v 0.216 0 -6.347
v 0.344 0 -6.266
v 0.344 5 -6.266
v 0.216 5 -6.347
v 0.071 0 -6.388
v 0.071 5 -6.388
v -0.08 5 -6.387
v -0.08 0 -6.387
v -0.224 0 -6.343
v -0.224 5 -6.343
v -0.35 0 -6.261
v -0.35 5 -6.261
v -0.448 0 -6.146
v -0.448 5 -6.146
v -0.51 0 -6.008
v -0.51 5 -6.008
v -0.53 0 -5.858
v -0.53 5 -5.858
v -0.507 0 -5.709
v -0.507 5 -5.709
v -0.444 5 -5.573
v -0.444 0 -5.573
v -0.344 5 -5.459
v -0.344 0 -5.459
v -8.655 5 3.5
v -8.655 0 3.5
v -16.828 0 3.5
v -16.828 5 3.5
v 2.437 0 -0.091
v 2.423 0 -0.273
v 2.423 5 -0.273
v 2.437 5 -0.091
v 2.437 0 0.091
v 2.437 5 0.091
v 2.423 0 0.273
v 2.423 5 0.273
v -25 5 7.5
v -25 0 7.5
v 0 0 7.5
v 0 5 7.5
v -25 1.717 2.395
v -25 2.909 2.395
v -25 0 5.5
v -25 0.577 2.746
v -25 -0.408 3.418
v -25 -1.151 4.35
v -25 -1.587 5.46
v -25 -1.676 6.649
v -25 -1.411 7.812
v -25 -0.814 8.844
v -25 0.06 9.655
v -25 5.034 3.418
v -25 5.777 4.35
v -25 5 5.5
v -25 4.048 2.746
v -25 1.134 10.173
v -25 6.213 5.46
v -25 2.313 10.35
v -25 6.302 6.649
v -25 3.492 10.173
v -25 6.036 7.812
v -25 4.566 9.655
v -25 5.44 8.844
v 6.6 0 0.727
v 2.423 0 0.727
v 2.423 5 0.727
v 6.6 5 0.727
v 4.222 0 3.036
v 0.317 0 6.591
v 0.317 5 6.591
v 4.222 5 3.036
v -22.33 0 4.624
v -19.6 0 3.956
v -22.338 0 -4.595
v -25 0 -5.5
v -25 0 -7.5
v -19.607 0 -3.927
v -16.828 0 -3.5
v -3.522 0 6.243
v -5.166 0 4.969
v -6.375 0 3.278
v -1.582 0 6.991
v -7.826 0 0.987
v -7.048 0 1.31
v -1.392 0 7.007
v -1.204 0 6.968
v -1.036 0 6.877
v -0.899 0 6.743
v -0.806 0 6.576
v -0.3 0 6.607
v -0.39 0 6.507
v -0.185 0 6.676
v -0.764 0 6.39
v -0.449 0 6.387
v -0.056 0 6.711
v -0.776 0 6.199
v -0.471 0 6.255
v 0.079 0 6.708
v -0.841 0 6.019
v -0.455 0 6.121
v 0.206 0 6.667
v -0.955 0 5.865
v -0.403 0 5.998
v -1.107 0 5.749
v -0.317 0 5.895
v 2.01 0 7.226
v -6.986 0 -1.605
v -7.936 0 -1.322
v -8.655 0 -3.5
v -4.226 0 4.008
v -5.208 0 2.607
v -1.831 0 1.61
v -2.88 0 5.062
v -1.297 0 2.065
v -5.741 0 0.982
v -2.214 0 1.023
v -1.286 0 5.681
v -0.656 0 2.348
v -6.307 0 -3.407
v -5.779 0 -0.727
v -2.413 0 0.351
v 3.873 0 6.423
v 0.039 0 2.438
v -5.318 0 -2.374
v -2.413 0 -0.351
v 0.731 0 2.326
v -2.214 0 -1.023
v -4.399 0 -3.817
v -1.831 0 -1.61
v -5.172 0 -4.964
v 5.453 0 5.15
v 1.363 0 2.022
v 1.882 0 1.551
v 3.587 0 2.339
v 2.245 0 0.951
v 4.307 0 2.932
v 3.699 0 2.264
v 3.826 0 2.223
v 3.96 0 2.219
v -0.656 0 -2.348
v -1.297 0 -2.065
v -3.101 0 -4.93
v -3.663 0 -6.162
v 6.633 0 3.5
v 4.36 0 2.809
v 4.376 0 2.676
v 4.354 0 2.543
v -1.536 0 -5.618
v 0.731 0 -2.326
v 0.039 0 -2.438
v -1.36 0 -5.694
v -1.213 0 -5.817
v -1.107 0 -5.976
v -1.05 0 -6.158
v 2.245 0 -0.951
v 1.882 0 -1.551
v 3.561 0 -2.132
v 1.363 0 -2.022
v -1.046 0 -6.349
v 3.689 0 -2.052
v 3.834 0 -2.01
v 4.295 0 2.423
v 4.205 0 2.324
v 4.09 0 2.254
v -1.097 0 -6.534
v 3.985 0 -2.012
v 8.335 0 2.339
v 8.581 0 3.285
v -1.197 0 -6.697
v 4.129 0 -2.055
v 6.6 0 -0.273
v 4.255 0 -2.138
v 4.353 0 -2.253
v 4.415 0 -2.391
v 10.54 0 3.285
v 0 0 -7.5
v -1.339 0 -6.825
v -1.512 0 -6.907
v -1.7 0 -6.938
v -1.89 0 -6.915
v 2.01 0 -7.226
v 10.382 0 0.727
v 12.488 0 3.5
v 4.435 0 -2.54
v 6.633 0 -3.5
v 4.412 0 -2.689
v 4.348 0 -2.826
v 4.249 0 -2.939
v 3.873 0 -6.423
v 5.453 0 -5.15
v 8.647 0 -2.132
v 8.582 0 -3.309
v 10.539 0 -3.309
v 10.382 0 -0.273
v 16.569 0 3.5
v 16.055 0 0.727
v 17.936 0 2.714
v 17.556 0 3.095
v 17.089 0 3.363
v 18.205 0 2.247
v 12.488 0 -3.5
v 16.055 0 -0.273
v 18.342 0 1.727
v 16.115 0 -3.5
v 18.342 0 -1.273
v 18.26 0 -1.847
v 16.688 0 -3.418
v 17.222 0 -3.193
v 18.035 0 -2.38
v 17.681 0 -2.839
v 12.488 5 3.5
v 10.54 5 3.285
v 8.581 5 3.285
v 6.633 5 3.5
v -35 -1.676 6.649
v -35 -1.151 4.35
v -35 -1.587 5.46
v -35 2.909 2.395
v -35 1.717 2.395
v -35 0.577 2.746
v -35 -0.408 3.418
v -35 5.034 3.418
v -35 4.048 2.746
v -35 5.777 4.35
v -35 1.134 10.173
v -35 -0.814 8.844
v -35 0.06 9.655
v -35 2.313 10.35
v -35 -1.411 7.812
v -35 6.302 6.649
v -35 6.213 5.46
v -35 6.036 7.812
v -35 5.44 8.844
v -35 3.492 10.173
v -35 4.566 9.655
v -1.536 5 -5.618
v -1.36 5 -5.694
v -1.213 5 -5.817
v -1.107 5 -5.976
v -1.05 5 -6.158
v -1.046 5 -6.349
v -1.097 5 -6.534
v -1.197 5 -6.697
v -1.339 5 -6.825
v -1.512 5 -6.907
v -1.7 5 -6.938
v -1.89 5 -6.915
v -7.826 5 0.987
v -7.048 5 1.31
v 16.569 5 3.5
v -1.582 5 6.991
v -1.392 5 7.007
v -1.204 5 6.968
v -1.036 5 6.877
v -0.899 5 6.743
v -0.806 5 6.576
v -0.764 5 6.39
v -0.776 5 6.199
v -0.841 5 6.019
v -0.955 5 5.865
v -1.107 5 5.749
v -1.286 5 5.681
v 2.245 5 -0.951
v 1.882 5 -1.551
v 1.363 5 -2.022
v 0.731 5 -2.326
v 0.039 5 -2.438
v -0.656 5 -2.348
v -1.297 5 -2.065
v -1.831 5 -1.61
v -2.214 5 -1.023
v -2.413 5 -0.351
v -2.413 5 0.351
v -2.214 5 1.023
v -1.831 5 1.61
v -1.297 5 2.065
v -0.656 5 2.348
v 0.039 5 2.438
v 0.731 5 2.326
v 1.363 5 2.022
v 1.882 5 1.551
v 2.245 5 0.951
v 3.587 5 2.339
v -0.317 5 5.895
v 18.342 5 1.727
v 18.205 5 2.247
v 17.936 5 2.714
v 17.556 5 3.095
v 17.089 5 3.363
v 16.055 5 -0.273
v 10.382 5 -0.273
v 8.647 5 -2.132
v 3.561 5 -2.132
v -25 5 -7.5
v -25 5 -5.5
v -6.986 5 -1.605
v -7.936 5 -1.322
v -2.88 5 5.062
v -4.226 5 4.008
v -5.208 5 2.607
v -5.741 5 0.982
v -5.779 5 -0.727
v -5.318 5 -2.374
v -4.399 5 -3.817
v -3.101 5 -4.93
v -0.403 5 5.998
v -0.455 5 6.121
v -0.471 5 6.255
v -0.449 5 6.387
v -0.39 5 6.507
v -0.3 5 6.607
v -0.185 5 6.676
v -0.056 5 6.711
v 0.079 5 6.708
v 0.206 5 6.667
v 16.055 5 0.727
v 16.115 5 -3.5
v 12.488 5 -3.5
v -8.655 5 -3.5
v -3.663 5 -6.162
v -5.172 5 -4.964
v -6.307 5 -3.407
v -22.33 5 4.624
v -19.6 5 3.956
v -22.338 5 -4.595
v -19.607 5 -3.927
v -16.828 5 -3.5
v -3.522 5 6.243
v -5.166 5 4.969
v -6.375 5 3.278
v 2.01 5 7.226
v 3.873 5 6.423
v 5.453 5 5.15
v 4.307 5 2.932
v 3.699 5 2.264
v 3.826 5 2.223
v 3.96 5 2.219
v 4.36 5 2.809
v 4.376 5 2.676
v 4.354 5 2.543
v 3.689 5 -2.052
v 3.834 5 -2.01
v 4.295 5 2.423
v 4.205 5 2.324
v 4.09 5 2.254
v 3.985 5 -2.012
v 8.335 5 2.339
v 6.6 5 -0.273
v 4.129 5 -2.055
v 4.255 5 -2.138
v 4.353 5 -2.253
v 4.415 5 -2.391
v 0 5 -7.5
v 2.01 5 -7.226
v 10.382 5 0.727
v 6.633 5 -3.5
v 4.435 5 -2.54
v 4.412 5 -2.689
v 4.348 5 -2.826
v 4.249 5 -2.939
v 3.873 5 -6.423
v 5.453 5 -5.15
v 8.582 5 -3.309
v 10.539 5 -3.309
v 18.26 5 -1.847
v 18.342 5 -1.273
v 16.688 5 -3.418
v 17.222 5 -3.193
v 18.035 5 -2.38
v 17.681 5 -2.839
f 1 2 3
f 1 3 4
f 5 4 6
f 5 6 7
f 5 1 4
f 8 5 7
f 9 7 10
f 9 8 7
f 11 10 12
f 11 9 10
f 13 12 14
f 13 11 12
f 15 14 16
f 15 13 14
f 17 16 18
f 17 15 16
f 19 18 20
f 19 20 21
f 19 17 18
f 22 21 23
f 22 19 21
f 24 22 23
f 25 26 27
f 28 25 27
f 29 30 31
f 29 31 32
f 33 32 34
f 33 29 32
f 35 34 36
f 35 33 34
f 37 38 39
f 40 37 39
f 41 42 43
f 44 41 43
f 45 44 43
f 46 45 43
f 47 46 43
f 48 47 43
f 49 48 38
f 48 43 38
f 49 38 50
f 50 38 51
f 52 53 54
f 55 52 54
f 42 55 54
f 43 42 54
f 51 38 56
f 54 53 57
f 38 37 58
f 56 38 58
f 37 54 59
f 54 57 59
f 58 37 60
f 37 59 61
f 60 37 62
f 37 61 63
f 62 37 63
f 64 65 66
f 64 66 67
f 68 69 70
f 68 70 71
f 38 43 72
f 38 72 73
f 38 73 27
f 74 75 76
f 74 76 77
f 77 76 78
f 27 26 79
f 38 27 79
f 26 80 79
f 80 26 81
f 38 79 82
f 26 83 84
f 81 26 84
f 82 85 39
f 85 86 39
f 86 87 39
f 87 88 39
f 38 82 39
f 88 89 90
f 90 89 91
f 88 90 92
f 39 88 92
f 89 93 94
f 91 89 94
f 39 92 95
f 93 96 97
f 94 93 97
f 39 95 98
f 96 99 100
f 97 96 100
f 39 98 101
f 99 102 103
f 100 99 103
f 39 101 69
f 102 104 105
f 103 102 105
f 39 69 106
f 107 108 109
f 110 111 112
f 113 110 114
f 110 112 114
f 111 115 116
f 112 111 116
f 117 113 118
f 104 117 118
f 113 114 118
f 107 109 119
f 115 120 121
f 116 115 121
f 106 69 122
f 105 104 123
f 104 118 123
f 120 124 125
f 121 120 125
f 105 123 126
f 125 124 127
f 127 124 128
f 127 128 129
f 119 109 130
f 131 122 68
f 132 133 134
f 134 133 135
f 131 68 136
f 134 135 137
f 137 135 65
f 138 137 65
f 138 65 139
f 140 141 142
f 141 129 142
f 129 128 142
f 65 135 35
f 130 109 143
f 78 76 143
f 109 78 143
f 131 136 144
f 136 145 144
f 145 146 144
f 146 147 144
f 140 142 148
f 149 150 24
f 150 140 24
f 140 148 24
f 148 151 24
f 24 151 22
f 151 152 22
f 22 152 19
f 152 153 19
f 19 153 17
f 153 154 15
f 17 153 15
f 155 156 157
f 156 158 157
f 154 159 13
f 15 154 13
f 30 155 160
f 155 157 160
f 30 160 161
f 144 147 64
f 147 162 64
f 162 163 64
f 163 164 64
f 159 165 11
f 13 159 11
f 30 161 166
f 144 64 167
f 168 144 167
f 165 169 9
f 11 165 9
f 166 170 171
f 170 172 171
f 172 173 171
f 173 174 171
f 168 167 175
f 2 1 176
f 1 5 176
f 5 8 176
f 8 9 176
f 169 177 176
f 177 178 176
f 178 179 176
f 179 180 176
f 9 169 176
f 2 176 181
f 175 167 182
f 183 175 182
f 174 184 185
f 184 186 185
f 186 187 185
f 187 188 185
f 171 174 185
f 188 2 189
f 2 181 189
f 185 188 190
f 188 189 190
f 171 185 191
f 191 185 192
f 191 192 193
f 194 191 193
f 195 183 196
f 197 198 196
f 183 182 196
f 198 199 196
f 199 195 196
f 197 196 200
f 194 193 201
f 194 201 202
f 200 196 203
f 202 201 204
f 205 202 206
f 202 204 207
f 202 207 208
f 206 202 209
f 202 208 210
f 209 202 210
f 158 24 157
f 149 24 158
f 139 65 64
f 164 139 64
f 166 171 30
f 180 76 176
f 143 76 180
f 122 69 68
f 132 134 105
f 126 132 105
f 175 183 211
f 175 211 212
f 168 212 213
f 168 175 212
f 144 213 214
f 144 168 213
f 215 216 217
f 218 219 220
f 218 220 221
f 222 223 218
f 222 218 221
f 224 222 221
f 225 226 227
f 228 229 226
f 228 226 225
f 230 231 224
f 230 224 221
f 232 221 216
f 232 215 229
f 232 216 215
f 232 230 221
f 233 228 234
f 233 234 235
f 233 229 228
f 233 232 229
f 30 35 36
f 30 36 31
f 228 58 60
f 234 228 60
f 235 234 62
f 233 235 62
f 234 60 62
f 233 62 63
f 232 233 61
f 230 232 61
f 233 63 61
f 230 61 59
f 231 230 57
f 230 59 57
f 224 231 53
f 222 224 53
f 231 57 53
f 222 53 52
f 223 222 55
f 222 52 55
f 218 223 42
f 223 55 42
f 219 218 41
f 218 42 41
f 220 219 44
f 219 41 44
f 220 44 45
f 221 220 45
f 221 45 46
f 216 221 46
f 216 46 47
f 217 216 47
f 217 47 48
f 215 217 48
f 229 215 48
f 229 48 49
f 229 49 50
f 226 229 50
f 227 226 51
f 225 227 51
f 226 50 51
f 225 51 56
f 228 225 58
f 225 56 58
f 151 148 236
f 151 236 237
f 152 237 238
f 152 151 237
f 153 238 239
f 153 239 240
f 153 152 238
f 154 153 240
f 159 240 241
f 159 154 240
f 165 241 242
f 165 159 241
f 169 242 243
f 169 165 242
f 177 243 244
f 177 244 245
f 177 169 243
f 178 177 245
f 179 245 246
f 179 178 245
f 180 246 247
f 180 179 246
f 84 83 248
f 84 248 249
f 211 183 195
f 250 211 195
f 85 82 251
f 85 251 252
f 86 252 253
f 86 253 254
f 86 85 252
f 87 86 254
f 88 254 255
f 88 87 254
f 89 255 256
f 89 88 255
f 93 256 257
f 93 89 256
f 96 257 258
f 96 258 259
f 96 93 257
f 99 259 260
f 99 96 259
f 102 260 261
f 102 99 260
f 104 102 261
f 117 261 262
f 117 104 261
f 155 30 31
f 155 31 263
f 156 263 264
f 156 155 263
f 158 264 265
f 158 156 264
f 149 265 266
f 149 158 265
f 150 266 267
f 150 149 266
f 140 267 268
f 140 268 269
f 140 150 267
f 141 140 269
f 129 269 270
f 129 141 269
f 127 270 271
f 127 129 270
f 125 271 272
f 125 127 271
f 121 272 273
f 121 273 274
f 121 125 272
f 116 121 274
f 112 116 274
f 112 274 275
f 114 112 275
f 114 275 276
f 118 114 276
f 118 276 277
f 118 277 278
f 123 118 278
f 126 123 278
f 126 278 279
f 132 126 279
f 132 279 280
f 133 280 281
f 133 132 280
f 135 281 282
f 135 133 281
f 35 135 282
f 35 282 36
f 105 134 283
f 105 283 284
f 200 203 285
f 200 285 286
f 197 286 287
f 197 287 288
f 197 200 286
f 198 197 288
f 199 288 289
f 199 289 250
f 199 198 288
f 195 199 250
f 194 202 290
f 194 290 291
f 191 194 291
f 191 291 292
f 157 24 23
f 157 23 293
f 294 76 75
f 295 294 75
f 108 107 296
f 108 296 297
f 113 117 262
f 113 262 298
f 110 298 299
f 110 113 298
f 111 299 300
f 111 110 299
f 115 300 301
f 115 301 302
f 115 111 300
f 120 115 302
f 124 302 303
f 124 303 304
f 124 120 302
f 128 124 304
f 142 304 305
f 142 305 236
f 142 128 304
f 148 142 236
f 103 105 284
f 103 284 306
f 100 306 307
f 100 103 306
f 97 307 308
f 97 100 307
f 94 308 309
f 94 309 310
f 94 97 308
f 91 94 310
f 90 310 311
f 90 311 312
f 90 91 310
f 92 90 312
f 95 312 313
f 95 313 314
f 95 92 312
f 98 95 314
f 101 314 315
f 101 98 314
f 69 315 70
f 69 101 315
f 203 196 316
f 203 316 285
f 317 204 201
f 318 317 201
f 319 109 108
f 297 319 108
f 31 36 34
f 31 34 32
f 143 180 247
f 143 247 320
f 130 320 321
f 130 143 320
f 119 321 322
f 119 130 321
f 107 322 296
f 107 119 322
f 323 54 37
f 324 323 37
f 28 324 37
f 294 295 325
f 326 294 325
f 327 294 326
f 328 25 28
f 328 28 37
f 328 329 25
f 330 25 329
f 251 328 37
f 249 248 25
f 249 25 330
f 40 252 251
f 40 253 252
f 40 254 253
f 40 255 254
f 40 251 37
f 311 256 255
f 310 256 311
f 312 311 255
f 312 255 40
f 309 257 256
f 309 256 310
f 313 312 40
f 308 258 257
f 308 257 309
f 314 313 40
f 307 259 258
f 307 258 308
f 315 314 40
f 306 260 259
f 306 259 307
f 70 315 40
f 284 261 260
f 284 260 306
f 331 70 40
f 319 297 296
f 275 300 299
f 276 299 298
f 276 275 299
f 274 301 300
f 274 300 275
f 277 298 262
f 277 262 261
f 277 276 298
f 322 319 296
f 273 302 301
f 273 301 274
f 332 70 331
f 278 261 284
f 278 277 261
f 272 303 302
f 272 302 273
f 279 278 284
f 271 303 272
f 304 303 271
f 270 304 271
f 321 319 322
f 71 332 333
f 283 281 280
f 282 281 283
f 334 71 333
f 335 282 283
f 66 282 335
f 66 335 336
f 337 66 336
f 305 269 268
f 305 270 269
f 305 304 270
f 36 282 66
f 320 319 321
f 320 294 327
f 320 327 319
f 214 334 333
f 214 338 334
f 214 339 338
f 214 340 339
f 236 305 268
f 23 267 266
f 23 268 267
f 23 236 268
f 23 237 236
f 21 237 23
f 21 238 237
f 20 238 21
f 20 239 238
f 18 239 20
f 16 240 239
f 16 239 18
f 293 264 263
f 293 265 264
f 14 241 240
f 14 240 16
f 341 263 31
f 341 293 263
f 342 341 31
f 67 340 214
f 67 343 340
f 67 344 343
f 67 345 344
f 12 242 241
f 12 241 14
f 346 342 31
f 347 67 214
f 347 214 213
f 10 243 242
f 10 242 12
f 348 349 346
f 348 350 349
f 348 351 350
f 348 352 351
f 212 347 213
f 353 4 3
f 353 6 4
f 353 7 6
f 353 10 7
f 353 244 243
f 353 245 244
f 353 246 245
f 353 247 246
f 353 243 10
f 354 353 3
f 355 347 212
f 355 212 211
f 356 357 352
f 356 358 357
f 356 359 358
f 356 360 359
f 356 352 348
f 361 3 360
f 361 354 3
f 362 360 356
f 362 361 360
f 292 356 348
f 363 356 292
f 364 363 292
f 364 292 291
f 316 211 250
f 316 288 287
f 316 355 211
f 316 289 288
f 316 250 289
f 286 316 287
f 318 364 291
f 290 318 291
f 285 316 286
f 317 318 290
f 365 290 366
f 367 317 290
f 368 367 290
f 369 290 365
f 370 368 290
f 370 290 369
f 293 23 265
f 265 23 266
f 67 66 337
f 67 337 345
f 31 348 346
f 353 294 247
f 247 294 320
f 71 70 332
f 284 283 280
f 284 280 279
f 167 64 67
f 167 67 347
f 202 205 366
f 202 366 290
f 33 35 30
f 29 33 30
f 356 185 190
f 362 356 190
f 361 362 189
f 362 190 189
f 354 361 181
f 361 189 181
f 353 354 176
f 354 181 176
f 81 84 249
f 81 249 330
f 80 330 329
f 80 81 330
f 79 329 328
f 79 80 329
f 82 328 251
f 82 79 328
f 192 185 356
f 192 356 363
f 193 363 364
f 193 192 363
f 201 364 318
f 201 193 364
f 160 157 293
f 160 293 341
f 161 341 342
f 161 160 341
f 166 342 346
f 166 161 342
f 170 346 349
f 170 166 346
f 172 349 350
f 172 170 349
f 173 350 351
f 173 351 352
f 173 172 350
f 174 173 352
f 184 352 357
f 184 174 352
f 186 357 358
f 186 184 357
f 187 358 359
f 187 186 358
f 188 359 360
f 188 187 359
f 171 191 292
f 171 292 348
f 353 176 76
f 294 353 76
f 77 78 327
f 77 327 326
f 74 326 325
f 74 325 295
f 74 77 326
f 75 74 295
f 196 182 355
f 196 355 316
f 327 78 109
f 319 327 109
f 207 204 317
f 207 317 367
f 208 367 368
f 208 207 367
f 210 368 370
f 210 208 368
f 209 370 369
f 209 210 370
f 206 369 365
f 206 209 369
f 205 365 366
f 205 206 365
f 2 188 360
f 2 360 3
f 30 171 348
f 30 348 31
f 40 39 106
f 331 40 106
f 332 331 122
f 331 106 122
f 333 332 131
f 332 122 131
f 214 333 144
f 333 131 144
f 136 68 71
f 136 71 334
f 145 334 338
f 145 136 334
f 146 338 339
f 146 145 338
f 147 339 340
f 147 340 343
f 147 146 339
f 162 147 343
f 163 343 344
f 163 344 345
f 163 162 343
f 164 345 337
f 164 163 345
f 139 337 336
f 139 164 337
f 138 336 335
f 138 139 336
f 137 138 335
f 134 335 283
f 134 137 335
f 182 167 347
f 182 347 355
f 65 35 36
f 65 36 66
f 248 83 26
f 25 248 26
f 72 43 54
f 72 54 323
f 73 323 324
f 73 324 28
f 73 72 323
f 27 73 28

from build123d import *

# Parameters (mm, degrees)
BOSS_EXTRUDE1_DEPTH = 5
CUT_EXTRUDE1_START  = -5
CUT_EXTRUDE1_DEPTH  = 5
SKETCH3_R           = 4
BOSS_EXTRUDE2_DEPTH = 10


# Read off the part's stored shape, not the designer's step: Cut-Extrude1
with BuildPart() as part:
    # Sketch1 → Boss-Extrude1 (new body)
    with BuildSketch(Plane(origin=(0, 0, 0), x_dir=(1, 0, 0), z_dir=(0, 1, 0))):
        with BuildLine():
            Line((-6.633249581, -3.5), (-8.655407426, -3.5))
            Line((-8.655407426, -3.5), (-25, -3.5))
            Line((-25, -3.5), (-25, -7.5))
            Line((-25, -7.5), (0, -7.5))
            ThreePointArc((0, -7.5), (-3.872983346, -6.422616289), (-6.633249581, -3.5))
        make_face()
        with BuildLine():
            ThreePointArc((-6.633249581, -3.5), (-7.280088319, -1.802862744), (-7.5, 0))
            Line((-7.5, 0), (-8.655407426, -3.5))
            Line((-8.655407426, -3.5), (-6.633249581, -3.5))
        make_face()
        with BuildLine():
            Line((-8.655407426, 3.5), (-7.5, 0))
            ThreePointArc((-7.5, 0), (-7.280088319, 1.802862744), (-6.633249581, 3.5))
            Line((-6.633249581, 3.5), (-8.655407426, 3.5))
        make_face()
        with BuildLine():
            Line((-25, 3.5), (-8.655407426, 3.5))
            Line((-8.655407426, 3.5), (-6.633249581, 3.5))
            ThreePointArc((-6.633249581, 3.5), (-3.872983346, 6.422616289), (0, 7.5))
            Line((0, 7.5), (-25, 7.5))
            Line((-25, 7.5), (-25, 3.5))
        make_face()
        with BuildLine():
            ThreePointArc((0, 7.5), (-3.872983346, 6.422616289), (-6.633249581, 3.5))
            Line((-6.633249581, 3.5), (0, 3.5))
            Line((0, 3.5), (0, 7.5))
        make_face()
        with BuildLine():
            ThreePointArc((-6.633249581, 3.5), (-7.280088319, 1.802862744), (-7.5, 0))
            ThreePointArc((-7.5, 0), (-7.280088319, -1.802862744), (-6.633249581, -3.5))
            Line((-6.633249581, -3.5), (0, -3.5))
            Line((0, -3.5), (0, -7.5))
            ThreePointArc((0, -7.5), (3.872983346, -6.422616289), (6.633249581, -3.5))
            Line((6.633249581, -3.5), (5.841817388, -3.5))
            Line((5.841817388, -3.5), (5.841817388, 3.5))
            Line((5.841817388, 3.5), (6.633249581, 3.5))
            ThreePointArc((6.633249581, 3.5), (3.872983346, 6.422616289), (0, 7.5))
            Line((0, 7.5), (0, 3.5))
            Line((0, 3.5), (-6.633249581, 3.5))
        make_face()
        with BuildLine():
            Line((0, -3.5), (-6.633249581, -3.5))
            ThreePointArc((-6.633249581, -3.5), (-3.872983346, -6.422616289), (0, -7.5))
            Line((0, -7.5), (0, -3.5))
        make_face()
        with BuildLine():
            Line((5.841817388, -3.5), (6.633249581, -3.5))
            ThreePointArc((6.633249581, -3.5), (7.280088319, -1.802862744), (7.5, 0))
            ThreePointArc((7.5, 0), (7.280088319, 1.802862744), (6.633249581, 3.5))
            Line((6.633249581, 3.5), (5.841817388, 3.5))
            Line((5.841817388, 3.5), (5.841817388, -3.5))
        make_face()
        with BuildLine():
            ThreePointArc((7.5, 0), (7.280088319, -1.802862744), (6.633249581, -3.5))
            Line((6.633249581, -3.5), (18.341817388, -3.5))
            Line((18.341817388, -3.5), (18.341817388, 3.5))
            Line((18.341817388, 3.5), (6.633249581, 3.5))
            ThreePointArc((6.633249581, 3.5), (7.280088319, 1.802862744), (7.5, 0))
        make_face()
    extrude(amount=BOSS_EXTRUDE1_DEPTH)

    # Cut-Extrude1 outline → Cut-Extrude1 (cut)
    with BuildSketch(Plane(origin=(0, 5, 0), x_dir=(1, 0, 0), z_dir=(0, 1, 0)).offset(CUT_EXTRUDE1_START)):
        with BuildLine():
            ThreePointArc((-25, -5.5), (-20.971570556, -4.264152844), (-16.827703713, -3.5))
            Line((-16.827703713, -3.5), (-25, -3.5))
            Line((-25, -3.5), (-25, -5.5))
        make_face()
        with BuildLine():
            Line((-6.986211906, 1.605049615), (-7.936290273, 1.321625532))
            Line((-7.936290273, 1.321625532), (-7.5, 0))
            Line((-7.5, 0), (-7.82594424, -0.987361527))
            Line((-7.82594424, -0.987361527), (-7.04751698, -1.309902849))
            ThreePointArc((-7.04751698, -1.309902849), (-5.16604089, -4.969442885), (-1.582216118, -6.991418541))
            ThreePointArc((-1.582216118, -6.991418541), (-0.778502232, -6.484346421), (-1.285574352, -5.680632535))
            ThreePointArc((-1.285574352, -5.680632535), (-5.822856725, -0.128945605), (-1.535782965, 5.618154331))
            ThreePointArc((-1.535782965, 5.618154331), (-1.064786538, 6.443527284), (-1.890159491, 6.914523712))
            ThreePointArc((-1.890159491, 6.914523712), (-5.171568533, 4.963690156), (-6.986211906, 1.605049615))
        make_face()
        with BuildLine():
            ThreePointArc((-16.827703713, 3.5), (-20.979738657, 4.230776773), (-25, 5.5))
            Line((-25, 5.5), (-25, 3.5))
            Line((-25, 3.5), (-16.827703713, 3.5))
        make_face()
        with BuildLine():
            Line((2.423046834, -0.273137336), (2.423046834, 0.273137336))
            ThreePointArc((2.423046834, 0.273137336), (-2.438392906, 0), (2.423046834, -0.273137336))
        make_face()
        with BuildLine():
            ThreePointArc((6.633249581, 3.5), (9.560391533, 3.285101605), (12.487533484, 3.5))
            Line((12.487533484, 3.5), (6.633249581, 3.5))
        make_face()
        with BuildLine():
            ThreePointArc((16.114954724, 3.5), (17.680951034, 2.839133646), (18.341817388, 1.273137336))
            Line((18.341817388, 1.273137336), (18.341817388, 3.5))
            Line((18.341817388, 3.5), (16.114954724, 3.5))
        make_face()
        with BuildLine():
            Line((6.633249581, -3.5), (12.487533484, -3.5))
            ThreePointArc((12.487533484, -3.5), (9.560391532, -3.257612869), (6.633249581, -3.5))
        make_face()
        with BuildLine():
            Line((18.341817388, -3.5), (18.341817388, -1.726862664))
            ThreePointArc((18.341817388, -1.726862664), (17.758698799, -2.916881411), (16.568680051, -3.5))
            Line((16.568680051, -3.5), (18.341817388, -3.5))
        make_face()
        with BuildLine():
            Line((6.599609394, 0.273137336), (2.423046834, 0.273137336))
            ThreePointArc((2.423046834, 0.273137336), (2.438392906, 0), (2.423046834, -0.273137336))
            Line((2.423046834, -0.273137336), (2.423046834, -0.726862664))
            Line((2.423046834, -0.726862664), (6.599609394, -0.726862664))
            Line((6.599609394, -0.726862664), (8.33499846, -2.338830502))
            Line((8.33499846, -2.338830502), (10.382432111, -0.726862664))
            Line((10.382432111, -0.726862664), (16.055042397, -0.726862664))
            Line((16.055042397, -0.726862664), (18.341817388, -1.726862664))
            Line((18.341817388, -1.726862664), (18.341817388, 1.273137336))
            Line((18.341817388, 1.273137336), (16.055042397, 0.273137336))
            Line((16.055042397, 0.273137336), (10.382432111, 0.273137336))
            Line((10.382432111, 0.273137336), (8.647043044, 2.132151084))
            Line((8.647043044, 2.132151084), (6.599609394, 0.273137336))
        make_face()
        with BuildLine():
            ThreePointArc((0.343811413, 6.266339021), (-0.403495587, 6.206654847), (-0.343811413, 5.459347847))
            Line((-0.343811413, 5.459347847), (3.560972322, 2.132151084))
            ThreePointArc((3.560972322, 2.132151084), (4.308279322, 2.191835258), (4.248595147, 2.939142258))
            Line((4.248595147, 2.939142258), (0.343811413, 6.266339021))
        make_face()
        with BuildLine():
            ThreePointArc((4.222069016, -3.035690029), (4.253213498, -2.369974984), (3.587498453, -2.338830502))
            Line((3.587498453, -2.338830502), (-0.317285282, -5.894584161))
            ThreePointArc((-0.317285282, -5.894584161), (-0.348429764, -6.560299207), (0.317285282, -6.591443689))
            Line((0.317285282, -6.591443689), (4.222069016, -3.035690029))
        make_face()
    extrude(amount=CUT_EXTRUDE1_DEPTH, mode=Mode.SUBTRACT)

    # Sketch3 → Boss-Extrude2 (add)
    with BuildSketch(Plane.ZY.offset(25)):
        with Locations((6.35032425, 2.312951567)):
            Circle(SKETCH3_R)
    extrude(amount=BOSS_EXTRUDE2_DEPTH)


solid = part.part
